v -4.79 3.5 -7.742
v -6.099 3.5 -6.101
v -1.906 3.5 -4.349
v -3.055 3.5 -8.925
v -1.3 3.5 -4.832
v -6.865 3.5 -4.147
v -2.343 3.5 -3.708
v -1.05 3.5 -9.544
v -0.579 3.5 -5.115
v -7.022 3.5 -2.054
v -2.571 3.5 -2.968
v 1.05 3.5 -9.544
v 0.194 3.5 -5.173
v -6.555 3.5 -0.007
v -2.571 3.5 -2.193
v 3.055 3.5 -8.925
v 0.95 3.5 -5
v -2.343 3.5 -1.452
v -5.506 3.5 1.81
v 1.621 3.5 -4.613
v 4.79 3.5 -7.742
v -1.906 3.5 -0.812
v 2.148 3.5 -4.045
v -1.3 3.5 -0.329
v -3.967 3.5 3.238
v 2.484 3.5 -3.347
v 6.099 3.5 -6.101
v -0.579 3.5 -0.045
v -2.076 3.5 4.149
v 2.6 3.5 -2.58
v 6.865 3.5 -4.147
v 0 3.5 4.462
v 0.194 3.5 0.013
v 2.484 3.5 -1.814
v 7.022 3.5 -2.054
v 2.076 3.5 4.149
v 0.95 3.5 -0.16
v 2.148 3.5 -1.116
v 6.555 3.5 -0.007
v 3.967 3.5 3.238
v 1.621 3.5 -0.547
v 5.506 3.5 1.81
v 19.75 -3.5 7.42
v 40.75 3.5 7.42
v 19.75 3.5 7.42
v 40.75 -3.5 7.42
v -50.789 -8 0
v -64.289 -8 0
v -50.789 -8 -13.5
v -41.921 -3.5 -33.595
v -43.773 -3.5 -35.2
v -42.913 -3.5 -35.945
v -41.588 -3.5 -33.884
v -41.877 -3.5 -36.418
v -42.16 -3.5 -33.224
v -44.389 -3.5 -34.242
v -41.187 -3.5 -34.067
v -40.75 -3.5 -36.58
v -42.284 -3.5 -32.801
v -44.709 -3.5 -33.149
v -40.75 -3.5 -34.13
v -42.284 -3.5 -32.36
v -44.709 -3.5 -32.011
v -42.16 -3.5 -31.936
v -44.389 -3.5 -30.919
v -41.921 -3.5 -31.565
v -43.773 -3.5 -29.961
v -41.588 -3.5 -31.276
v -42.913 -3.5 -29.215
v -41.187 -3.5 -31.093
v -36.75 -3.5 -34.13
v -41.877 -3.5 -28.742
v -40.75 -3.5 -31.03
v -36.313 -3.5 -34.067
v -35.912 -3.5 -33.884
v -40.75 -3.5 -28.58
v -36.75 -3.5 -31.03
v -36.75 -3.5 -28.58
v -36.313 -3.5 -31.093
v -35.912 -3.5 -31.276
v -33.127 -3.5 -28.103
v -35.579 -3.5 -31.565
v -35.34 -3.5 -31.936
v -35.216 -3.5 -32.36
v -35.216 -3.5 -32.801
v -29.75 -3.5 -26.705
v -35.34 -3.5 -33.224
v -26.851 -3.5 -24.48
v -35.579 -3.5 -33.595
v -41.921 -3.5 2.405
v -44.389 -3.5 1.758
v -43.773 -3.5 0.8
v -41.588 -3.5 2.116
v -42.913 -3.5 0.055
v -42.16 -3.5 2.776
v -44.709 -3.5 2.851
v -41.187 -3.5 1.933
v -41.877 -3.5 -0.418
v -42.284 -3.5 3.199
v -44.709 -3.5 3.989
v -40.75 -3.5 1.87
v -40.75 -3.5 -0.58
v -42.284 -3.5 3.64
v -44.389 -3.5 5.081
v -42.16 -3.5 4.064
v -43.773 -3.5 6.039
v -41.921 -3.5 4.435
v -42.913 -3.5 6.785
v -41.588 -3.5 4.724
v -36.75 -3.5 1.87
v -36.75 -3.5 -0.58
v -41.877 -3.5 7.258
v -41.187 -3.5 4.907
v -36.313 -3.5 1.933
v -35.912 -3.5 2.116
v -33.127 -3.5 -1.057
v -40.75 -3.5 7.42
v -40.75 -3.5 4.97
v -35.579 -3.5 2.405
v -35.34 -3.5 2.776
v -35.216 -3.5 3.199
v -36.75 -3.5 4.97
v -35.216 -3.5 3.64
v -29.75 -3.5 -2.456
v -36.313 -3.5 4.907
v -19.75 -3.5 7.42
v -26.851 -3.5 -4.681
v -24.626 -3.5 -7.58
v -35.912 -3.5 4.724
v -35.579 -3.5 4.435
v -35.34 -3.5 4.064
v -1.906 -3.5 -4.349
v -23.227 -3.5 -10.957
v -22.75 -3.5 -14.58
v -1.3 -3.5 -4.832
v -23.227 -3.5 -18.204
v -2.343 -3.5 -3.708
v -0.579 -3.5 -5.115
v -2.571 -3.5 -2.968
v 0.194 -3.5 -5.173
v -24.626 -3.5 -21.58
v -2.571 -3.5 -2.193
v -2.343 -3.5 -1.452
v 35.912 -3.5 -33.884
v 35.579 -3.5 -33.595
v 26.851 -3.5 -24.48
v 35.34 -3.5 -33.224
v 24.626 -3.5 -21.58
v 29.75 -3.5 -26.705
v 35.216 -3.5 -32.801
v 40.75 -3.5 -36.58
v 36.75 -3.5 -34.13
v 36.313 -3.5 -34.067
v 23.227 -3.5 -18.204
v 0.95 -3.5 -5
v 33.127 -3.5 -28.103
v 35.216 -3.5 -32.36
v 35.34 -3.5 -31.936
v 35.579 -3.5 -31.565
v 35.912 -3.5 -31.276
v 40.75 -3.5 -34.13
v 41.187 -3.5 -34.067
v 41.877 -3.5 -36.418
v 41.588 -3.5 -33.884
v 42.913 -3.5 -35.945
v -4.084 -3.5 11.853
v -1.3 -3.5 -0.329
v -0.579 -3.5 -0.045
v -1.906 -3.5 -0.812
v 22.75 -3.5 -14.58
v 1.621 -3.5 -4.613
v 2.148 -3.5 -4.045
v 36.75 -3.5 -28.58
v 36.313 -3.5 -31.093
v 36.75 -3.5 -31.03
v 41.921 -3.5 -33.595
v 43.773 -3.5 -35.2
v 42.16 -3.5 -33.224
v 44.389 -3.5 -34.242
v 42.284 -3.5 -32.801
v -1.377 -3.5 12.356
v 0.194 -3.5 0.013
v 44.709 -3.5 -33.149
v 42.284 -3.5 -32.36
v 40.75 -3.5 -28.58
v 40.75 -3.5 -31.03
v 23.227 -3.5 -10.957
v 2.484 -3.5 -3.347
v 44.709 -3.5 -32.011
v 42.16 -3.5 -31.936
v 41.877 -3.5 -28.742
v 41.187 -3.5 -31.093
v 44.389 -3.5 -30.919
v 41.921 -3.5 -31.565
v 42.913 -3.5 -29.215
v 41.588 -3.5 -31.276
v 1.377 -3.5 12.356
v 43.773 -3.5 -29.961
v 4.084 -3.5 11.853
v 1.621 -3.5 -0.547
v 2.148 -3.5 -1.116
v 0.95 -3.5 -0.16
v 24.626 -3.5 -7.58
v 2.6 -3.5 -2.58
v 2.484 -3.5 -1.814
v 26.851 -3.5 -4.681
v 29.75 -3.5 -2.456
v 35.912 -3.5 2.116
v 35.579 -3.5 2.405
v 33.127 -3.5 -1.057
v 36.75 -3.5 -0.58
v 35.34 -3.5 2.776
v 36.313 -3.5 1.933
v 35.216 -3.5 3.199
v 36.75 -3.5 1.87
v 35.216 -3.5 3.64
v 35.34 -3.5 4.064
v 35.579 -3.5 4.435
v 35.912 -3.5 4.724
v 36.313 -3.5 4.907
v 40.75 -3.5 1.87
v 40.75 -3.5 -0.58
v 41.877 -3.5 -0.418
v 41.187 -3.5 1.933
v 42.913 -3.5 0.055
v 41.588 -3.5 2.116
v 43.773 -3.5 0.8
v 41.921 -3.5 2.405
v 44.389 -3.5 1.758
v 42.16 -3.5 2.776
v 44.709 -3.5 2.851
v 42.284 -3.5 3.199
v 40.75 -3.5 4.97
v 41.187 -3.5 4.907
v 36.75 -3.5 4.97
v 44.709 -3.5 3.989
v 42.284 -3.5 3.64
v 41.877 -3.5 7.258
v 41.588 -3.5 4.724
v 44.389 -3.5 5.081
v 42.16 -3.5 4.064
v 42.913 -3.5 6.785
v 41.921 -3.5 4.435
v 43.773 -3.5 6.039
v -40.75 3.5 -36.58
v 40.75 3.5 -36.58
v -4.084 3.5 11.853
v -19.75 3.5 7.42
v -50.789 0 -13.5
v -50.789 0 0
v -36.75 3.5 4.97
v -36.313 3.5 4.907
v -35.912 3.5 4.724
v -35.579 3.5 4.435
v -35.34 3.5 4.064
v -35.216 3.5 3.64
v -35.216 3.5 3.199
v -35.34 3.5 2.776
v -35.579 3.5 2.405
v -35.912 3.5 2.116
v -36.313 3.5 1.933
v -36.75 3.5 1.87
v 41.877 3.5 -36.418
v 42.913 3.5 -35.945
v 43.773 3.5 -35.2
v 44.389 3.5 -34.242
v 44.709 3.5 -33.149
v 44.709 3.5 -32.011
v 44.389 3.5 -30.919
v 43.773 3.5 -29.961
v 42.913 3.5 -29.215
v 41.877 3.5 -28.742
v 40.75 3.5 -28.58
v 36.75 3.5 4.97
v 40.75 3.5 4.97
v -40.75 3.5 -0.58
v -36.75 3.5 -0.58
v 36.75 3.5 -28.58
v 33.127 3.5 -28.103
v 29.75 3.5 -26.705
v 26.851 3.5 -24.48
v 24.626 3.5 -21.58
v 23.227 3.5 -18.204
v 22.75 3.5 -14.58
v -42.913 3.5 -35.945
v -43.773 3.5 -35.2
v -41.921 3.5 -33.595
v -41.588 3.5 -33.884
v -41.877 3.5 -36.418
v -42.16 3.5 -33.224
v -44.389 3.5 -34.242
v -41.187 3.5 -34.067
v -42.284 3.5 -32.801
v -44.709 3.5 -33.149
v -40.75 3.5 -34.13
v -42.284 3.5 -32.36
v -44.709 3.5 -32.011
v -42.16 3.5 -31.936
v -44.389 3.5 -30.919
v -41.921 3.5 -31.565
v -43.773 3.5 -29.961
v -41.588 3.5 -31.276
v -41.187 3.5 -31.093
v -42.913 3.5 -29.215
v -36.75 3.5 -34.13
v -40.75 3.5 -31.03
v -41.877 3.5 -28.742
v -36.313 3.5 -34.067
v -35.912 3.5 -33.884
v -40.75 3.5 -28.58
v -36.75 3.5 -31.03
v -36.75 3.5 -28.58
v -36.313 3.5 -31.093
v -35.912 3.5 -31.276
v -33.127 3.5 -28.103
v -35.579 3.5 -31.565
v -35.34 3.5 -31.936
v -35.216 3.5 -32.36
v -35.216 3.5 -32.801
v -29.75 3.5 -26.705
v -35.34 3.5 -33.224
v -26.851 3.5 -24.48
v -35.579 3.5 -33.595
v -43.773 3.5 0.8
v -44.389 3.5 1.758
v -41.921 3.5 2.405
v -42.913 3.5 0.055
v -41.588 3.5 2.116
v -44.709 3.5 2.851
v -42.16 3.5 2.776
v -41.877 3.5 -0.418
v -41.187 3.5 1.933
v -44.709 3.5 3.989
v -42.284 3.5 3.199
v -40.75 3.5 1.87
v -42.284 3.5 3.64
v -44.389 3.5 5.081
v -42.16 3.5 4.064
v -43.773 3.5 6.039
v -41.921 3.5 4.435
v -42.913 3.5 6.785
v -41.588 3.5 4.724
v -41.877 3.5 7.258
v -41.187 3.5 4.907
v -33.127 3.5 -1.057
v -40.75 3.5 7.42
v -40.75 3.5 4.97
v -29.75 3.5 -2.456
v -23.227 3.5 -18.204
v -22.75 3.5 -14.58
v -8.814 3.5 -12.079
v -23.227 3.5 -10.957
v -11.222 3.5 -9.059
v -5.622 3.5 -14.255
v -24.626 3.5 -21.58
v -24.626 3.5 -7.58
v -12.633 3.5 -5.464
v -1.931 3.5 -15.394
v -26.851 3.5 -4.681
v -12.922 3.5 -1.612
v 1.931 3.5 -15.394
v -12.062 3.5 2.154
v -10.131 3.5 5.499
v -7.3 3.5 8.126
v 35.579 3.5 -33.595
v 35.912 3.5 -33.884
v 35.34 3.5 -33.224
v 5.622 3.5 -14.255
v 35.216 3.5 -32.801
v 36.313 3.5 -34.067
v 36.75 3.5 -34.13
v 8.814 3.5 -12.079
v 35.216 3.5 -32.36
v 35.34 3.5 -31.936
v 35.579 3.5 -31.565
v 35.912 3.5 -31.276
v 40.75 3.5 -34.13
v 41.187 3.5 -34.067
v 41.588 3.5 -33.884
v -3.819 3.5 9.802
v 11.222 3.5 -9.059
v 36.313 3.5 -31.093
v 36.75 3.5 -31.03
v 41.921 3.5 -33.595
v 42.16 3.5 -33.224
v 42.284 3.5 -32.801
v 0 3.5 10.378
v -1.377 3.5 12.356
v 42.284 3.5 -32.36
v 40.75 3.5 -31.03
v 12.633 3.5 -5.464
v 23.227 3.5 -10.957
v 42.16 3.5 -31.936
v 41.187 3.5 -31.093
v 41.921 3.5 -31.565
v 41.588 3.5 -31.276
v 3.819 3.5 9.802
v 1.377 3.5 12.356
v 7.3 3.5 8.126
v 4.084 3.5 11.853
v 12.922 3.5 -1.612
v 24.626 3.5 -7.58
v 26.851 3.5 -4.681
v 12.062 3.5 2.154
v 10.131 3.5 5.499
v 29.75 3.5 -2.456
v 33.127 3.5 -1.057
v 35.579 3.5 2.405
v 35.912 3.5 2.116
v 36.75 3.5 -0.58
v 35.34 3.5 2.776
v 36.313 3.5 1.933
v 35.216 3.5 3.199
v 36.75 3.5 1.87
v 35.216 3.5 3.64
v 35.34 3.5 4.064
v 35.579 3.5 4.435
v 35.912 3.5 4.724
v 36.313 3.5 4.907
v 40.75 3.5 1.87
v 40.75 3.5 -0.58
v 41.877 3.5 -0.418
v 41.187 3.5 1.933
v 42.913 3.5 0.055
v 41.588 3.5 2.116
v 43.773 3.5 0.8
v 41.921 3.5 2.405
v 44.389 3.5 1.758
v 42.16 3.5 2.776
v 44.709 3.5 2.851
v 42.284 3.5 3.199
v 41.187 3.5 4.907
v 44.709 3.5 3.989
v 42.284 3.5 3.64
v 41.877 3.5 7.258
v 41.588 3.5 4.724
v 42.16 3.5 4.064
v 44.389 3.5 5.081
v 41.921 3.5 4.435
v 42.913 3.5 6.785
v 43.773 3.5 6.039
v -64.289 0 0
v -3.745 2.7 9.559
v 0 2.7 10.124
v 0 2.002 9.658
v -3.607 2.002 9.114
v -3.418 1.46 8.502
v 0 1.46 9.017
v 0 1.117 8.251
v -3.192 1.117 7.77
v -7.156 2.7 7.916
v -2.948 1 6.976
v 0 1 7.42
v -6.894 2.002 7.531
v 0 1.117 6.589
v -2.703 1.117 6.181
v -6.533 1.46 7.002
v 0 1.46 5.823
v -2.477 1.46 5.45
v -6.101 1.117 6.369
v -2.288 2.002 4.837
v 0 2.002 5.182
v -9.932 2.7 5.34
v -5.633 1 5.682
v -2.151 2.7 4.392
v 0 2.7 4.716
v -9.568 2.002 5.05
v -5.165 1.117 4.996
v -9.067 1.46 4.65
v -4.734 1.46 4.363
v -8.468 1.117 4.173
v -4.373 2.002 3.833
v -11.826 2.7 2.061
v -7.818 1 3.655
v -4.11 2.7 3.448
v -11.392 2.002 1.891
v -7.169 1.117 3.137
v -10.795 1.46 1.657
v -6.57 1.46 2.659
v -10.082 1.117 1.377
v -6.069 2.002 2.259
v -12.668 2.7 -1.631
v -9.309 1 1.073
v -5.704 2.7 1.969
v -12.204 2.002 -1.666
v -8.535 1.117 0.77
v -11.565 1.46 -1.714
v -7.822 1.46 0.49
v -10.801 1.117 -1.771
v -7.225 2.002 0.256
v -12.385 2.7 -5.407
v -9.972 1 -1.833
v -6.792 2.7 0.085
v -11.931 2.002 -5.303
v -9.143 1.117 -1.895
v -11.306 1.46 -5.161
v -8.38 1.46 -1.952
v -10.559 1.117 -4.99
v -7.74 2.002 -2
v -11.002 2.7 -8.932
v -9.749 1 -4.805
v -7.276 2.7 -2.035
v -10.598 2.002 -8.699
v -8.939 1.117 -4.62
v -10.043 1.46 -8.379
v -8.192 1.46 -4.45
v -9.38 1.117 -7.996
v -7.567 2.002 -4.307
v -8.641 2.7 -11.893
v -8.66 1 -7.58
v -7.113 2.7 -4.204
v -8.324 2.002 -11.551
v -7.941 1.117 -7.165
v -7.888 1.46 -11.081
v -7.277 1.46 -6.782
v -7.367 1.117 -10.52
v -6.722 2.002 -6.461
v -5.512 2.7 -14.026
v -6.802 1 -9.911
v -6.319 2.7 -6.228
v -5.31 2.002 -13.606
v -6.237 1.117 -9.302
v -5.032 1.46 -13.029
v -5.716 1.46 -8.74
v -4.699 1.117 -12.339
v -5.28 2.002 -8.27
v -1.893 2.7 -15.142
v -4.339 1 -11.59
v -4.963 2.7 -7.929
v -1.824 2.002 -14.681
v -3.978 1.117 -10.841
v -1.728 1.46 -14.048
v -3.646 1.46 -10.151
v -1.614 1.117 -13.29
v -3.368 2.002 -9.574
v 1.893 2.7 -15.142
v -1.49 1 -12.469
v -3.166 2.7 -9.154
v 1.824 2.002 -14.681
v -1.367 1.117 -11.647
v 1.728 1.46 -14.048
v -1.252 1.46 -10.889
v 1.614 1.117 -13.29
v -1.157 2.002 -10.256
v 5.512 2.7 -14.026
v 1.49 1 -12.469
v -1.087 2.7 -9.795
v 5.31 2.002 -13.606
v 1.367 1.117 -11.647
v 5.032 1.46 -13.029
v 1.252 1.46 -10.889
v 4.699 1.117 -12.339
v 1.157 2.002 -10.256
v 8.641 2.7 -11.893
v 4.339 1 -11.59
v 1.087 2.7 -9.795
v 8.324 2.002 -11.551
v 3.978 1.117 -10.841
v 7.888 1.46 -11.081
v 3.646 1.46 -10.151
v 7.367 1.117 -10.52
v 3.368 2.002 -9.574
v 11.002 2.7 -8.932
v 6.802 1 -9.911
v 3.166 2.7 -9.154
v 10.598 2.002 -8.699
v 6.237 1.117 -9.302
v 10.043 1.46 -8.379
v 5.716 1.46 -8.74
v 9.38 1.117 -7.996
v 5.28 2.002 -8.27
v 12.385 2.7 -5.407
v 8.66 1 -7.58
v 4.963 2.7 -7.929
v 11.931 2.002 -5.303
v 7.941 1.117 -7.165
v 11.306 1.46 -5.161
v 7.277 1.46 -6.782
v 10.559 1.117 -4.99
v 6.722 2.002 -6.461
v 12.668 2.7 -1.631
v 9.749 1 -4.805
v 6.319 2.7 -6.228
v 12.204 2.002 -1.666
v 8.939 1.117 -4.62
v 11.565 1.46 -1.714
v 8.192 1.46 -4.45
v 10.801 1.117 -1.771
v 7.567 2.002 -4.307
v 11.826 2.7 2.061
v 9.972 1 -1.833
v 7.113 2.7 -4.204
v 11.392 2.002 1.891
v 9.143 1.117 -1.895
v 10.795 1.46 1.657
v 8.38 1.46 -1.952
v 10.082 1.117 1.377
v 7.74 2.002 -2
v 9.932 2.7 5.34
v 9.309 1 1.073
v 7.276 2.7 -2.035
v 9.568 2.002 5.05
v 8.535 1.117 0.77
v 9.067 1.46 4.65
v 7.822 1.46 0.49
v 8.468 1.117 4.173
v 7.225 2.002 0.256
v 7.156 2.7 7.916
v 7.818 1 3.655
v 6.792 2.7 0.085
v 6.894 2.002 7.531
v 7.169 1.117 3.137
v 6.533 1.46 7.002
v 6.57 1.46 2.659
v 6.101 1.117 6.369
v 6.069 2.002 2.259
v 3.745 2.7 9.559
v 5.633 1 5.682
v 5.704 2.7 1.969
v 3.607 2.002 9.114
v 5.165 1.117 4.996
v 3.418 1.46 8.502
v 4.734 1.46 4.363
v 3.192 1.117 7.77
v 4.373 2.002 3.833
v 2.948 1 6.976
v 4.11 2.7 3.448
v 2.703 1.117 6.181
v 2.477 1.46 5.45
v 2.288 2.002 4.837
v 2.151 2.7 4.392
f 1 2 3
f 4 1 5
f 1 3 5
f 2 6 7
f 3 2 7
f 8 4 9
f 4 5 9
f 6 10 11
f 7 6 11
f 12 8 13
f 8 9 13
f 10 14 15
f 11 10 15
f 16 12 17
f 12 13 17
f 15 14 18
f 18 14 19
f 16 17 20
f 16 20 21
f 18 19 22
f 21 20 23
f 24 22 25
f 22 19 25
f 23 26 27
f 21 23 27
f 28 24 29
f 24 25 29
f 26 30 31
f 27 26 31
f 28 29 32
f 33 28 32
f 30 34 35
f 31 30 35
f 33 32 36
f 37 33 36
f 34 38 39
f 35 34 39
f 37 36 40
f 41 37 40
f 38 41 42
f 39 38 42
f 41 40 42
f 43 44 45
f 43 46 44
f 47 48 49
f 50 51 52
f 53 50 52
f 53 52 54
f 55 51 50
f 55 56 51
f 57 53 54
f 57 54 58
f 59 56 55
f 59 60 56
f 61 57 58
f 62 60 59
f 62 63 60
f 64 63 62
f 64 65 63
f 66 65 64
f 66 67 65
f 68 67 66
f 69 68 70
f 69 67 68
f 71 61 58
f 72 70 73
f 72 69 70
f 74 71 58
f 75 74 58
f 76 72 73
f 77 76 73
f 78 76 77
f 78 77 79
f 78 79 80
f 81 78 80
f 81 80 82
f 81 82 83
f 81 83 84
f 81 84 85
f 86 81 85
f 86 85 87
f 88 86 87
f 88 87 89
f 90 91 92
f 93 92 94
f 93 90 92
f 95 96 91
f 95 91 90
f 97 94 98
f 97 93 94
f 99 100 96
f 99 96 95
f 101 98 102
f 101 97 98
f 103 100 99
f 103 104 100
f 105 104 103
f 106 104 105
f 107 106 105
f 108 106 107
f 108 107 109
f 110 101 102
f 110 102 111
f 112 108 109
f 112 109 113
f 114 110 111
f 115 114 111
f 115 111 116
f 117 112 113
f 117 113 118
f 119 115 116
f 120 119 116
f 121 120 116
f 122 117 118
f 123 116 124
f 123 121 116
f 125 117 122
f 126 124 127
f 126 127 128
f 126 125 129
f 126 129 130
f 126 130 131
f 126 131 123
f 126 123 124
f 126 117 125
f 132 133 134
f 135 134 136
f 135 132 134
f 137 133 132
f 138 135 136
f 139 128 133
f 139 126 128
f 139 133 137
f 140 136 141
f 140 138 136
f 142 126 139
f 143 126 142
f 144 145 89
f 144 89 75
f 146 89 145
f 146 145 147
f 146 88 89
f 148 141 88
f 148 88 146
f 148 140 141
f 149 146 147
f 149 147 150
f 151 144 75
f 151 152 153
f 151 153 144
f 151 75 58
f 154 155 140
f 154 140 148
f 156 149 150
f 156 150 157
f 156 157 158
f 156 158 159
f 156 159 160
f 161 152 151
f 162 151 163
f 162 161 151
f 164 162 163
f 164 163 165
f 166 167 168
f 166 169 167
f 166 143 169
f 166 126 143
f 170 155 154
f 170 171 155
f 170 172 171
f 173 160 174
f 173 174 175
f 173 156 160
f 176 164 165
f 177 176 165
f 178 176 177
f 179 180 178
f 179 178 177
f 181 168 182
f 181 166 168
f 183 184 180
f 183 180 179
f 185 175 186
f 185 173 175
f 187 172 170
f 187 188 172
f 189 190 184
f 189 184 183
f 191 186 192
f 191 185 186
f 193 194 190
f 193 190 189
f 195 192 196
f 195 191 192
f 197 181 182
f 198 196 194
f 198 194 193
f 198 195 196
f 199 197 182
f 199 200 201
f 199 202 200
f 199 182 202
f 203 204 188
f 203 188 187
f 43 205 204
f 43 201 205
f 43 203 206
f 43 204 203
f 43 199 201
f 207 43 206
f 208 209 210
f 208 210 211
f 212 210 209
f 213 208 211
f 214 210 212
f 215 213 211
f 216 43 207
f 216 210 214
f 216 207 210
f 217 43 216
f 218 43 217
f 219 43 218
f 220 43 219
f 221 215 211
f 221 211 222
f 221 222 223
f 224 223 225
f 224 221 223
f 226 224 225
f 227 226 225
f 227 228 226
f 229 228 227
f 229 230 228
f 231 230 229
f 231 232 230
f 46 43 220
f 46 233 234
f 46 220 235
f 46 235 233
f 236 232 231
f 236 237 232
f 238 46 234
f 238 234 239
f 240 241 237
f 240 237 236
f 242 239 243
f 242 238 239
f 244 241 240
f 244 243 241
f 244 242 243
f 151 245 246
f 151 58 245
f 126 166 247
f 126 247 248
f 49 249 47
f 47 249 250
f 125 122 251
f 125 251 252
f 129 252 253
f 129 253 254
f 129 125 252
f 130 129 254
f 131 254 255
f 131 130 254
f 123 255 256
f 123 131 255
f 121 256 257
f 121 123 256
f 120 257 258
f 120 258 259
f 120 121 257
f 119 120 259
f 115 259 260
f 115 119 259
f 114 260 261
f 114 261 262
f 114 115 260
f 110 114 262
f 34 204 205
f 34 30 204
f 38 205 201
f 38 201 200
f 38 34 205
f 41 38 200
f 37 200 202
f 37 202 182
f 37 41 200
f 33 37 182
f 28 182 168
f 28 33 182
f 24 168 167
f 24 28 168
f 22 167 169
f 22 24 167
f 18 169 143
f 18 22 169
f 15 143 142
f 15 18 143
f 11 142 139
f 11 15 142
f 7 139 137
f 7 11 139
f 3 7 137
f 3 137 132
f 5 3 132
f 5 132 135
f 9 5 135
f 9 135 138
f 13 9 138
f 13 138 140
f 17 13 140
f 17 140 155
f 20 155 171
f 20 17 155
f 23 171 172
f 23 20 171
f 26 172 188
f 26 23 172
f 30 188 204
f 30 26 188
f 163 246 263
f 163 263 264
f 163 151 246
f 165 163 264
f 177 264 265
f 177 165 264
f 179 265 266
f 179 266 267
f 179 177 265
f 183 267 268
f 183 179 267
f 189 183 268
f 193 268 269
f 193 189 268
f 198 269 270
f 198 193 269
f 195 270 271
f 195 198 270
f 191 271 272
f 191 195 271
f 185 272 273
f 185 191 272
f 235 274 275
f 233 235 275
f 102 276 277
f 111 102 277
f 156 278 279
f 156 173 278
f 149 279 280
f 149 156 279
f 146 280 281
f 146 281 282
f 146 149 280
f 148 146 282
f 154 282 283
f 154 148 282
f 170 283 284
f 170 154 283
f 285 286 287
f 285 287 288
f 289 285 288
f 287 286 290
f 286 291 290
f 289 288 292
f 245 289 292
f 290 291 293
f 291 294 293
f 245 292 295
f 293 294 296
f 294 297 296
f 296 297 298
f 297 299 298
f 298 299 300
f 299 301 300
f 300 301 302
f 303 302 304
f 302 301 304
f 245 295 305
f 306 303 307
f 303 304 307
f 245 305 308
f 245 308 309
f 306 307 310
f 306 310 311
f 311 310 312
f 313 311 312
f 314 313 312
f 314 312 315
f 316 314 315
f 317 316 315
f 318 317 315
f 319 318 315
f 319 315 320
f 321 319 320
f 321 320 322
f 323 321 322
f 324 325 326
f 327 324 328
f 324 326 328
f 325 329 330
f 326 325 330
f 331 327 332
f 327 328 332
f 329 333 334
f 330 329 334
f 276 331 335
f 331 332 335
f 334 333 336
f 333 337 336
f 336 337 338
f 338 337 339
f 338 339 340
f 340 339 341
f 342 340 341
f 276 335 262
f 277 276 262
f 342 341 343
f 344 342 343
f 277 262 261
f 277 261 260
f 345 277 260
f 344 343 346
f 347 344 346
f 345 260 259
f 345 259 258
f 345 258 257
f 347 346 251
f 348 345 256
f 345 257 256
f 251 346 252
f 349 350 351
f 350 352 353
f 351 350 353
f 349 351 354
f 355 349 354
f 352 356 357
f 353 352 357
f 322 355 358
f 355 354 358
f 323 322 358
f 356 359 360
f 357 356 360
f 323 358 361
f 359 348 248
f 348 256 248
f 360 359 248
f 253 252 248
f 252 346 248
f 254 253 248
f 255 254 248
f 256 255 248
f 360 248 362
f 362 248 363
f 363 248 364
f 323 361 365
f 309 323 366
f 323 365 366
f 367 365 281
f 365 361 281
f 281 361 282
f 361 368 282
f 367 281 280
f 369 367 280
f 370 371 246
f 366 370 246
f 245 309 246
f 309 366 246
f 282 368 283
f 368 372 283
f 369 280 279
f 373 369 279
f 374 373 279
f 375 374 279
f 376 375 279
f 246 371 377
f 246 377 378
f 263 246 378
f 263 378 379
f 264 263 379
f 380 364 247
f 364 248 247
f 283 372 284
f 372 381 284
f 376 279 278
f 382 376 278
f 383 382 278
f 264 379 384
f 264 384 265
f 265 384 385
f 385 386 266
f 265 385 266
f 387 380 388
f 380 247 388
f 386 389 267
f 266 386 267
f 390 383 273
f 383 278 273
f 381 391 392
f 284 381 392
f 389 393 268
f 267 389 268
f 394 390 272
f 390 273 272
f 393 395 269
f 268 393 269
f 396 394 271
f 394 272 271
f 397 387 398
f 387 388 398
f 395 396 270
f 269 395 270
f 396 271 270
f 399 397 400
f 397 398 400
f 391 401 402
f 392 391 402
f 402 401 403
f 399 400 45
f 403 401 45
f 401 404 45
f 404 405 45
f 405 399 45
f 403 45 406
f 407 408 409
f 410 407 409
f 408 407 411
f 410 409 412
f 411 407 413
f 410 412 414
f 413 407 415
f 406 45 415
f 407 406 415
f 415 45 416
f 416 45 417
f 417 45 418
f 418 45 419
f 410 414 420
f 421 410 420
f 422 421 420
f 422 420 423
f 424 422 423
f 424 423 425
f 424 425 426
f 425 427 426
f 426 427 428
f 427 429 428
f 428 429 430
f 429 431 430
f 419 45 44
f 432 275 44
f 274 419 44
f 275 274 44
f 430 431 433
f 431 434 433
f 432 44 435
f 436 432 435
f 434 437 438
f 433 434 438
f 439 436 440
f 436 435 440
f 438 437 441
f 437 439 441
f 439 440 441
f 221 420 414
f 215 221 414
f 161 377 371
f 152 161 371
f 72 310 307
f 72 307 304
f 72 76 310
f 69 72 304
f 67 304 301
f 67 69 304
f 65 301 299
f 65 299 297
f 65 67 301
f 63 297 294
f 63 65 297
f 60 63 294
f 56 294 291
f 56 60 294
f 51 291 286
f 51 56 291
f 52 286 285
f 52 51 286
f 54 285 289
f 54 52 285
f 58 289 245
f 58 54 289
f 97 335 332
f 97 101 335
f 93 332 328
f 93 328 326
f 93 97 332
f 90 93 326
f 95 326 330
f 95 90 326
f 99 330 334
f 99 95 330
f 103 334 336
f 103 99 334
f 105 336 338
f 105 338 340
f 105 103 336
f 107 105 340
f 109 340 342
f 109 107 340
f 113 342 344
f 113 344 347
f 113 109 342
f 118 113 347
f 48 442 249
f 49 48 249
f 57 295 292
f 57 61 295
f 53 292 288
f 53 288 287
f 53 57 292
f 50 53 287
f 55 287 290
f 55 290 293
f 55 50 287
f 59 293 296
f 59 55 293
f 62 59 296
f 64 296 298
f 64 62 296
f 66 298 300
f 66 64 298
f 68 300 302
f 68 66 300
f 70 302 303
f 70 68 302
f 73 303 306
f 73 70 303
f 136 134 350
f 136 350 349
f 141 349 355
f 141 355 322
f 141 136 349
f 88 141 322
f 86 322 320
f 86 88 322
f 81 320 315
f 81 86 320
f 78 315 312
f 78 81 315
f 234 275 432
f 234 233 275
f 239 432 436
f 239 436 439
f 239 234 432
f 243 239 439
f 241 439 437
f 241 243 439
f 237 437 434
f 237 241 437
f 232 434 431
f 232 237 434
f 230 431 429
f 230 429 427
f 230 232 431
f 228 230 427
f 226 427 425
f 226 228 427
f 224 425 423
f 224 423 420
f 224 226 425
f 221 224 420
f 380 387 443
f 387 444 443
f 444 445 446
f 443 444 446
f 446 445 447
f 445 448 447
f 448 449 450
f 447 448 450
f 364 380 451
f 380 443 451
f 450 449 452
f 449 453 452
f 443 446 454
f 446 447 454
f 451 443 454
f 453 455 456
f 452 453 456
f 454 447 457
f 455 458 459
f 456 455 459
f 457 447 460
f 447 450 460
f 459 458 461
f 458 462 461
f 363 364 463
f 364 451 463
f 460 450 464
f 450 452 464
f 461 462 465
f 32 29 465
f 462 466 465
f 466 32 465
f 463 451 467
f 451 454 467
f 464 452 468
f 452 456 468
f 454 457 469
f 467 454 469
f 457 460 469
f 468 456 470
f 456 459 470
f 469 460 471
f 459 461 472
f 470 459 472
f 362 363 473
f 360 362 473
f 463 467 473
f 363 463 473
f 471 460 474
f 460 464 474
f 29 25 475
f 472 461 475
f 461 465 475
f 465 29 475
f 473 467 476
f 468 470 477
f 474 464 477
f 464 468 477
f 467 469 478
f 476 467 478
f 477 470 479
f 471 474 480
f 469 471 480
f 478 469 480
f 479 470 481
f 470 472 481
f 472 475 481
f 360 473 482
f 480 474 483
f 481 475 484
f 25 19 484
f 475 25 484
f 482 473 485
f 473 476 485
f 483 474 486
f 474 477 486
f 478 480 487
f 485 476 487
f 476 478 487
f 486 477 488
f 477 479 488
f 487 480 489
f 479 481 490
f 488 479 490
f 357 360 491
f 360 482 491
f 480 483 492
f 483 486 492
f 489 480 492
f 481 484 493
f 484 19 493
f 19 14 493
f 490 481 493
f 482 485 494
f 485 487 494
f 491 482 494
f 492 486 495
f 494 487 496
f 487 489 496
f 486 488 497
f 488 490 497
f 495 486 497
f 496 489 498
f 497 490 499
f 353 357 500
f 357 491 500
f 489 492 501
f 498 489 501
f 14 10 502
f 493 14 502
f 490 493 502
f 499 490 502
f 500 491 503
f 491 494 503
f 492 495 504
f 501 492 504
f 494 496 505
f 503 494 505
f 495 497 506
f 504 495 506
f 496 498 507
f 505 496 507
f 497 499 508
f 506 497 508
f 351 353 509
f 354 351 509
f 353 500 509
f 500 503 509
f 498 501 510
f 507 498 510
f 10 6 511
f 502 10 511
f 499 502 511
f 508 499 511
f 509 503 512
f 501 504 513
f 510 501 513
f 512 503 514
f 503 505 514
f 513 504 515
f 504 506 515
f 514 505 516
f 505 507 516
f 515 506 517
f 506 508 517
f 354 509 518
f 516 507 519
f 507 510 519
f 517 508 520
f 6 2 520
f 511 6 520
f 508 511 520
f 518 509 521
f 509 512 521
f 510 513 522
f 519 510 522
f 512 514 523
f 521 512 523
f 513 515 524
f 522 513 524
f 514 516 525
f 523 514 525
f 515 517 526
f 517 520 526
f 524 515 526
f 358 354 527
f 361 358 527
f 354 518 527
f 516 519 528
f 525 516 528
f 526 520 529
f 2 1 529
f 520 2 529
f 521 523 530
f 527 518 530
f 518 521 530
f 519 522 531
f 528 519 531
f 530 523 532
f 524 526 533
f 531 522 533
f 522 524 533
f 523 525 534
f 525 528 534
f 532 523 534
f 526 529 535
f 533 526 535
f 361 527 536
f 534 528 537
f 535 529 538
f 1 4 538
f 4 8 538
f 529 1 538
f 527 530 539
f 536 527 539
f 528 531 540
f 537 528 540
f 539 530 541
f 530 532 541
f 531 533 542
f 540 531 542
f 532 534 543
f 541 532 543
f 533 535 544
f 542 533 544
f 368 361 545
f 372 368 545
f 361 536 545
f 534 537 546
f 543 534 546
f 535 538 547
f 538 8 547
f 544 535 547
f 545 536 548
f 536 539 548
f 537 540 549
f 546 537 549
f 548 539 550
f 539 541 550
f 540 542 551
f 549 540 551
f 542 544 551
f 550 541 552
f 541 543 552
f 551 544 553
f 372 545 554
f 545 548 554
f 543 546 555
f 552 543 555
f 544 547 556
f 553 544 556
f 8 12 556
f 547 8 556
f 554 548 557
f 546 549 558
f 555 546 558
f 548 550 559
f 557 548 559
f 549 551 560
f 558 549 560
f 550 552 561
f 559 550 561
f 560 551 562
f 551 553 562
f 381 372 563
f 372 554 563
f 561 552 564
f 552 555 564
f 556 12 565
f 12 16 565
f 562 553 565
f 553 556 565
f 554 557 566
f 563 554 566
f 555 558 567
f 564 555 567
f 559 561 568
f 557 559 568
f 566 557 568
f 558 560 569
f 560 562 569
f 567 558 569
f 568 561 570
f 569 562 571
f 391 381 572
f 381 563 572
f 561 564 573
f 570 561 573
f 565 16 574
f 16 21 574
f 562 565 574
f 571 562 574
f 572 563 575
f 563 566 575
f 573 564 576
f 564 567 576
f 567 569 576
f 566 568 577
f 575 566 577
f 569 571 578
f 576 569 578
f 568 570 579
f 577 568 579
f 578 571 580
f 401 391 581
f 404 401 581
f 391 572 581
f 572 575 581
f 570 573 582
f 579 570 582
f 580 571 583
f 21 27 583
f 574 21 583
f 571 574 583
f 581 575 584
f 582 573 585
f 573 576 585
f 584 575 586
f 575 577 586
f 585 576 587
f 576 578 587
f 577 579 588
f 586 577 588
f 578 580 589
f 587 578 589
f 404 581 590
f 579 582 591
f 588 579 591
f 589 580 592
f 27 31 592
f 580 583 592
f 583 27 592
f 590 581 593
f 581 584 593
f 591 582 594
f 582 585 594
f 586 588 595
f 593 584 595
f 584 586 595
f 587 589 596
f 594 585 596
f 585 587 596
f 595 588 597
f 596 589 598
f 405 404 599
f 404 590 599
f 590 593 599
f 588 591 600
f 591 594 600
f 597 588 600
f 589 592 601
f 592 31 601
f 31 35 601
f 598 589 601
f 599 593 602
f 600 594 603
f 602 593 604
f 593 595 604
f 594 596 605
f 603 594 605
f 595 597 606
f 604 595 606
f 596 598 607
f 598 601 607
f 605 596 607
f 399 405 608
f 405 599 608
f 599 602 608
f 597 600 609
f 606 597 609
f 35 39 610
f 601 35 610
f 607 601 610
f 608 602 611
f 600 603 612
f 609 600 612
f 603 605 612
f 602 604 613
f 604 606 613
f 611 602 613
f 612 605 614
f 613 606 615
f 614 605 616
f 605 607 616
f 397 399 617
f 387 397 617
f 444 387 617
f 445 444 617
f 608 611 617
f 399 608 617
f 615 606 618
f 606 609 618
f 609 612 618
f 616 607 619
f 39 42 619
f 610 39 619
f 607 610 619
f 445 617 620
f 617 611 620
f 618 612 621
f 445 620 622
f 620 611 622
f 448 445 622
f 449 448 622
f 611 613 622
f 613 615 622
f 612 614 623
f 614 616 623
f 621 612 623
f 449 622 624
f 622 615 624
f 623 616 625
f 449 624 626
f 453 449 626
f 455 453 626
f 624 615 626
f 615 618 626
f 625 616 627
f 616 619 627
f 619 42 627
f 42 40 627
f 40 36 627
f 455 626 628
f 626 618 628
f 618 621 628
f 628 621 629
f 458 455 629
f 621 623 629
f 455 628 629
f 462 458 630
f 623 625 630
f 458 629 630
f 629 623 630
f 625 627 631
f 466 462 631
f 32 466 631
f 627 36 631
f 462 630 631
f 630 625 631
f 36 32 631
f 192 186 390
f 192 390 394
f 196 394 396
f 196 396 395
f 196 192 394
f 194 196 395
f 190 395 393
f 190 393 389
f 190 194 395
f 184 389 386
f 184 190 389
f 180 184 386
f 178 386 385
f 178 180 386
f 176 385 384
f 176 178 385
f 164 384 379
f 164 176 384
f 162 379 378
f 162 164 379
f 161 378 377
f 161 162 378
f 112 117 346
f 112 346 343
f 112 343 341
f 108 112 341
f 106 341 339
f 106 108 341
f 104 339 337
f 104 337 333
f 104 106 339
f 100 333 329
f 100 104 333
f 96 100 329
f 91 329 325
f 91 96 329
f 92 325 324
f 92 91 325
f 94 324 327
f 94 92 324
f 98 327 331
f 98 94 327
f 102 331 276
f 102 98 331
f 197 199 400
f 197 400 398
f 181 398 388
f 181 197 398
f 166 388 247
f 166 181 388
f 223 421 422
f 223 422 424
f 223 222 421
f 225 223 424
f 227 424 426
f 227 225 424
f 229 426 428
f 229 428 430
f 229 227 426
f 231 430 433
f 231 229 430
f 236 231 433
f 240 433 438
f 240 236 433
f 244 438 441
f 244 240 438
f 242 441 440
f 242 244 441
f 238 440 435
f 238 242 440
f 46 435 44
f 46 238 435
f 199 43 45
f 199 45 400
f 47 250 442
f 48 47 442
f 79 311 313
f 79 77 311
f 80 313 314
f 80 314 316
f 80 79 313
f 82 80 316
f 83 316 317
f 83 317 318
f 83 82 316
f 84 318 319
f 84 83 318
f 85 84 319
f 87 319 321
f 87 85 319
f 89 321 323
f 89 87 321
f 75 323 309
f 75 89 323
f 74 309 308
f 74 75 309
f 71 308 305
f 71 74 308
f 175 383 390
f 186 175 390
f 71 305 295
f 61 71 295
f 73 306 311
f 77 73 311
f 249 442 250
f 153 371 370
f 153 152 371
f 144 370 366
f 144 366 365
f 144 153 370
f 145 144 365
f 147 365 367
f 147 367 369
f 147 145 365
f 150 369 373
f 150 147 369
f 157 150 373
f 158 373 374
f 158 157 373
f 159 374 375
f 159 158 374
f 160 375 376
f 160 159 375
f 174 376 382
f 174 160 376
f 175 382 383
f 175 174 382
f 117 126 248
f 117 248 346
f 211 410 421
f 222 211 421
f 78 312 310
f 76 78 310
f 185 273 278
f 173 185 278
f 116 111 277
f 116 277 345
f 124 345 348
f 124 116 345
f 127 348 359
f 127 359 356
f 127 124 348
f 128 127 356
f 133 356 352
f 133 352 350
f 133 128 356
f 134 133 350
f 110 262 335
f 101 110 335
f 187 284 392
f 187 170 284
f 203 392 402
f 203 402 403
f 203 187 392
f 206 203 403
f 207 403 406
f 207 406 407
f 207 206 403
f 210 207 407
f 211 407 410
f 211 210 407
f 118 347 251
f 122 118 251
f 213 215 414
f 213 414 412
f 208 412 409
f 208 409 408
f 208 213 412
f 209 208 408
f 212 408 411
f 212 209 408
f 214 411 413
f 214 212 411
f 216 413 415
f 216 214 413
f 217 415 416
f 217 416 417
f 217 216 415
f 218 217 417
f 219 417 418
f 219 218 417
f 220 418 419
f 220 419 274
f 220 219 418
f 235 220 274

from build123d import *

# Parameters (mm, degrees)
F0_R          = 2.6
F1_DEPTH      = 3.5
F1_DEPTH_BACK = 3.5
F2_DEPTH      = 8
F3_R          = 3


# Not quite as in the source:
# - ends of sketch curves that miss each other by under 0.0002 mm in the source are joined


with BuildPart() as f1:
    # F0 (on Front) → F1 (new body, two sides)
    with BuildSketch(Plane.XZ) as f1_sk:
        with BuildLine():
            Line((40.7500048285, 7.4198008843), (19.75, 7.4198008843))
            Line((19.75, 7.4198008843), (19.75, -14.5801991157))
            Line((19.75, -14.5801991157), (22.7499971869, -14.5801991157))
            ThreePointArc((22.7499971869, -14.5801991157), (26.8505050634, -4.6807041791), (36.75, -0.5801991157))
            Line((36.75, -0.5801991157), (40.75, -0.5801991157))
            ThreePointArc((40.75, -0.5801991157), (44.75, 3.4197984701), (40.7500048285, 7.4198008843))
        make_face()
        with BuildLine():
            Line((40.75, 1.8698008843), (36.75, 1.8698008843))
            ThreePointArc((36.75, 1.8698008843), (35.2, 3.4198008843), (36.75, 4.9698008843))
            Line((36.75, 4.9698008843), (40.75, 4.9698008843))
            ThreePointArc((40.75, 4.9698008843), (42.3, 3.4198008843), (40.75, 1.8698008843))
        make_face(mode=Mode.SUBTRACT)
        with BuildLine():
            Line((22.7499971869, -14.5801991157), (19.75, -14.5801991157))
            Line((19.75, -14.5801991157), (19.75, -36.5801991157))
            Line((19.75, -36.5801991157), (40.7500048285, -36.5801991157))
            ThreePointArc((40.7500048285, -36.5801991157), (44.75, -32.5801967015), (40.75, -28.5801991157))
            Line((40.75, -28.5801991157), (36.75, -28.5801991157))
            ThreePointArc((36.75, -28.5801991157), (26.8505050634, -24.4796940523), (22.7499971869, -14.5801991157))
        make_face()
        with BuildLine():
            ThreePointArc((40.75, -31.0301991157), (42.3, -32.5801991157), (40.75, -34.1301991157))
            Line((40.75, -34.1301991157), (36.75, -34.1301991157))
            ThreePointArc((36.75, -34.1301991157), (35.2, -32.5801991157), (36.75, -31.0301991157))
            Line((36.75, -31.0301991157), (40.75, -31.0301991157))
        make_face(mode=Mode.SUBTRACT)
        with BuildLine():
            ThreePointArc((4.0844565269, 11.8529992436), (11.9638381781, 6.4678159179), (15, -2.5801991157))
            ThreePointArc((15, -2.5801991157), (-9.0480150336, -14.5440372938), (-4.0844565269, 11.8529992436))
            Line((-4.0844565269, 11.8529992436), (-19.75, 7.4198008843))
            Line((-19.75, 7.4198008843), (-19.75, -14.5801991157))
            Line((-19.75, -14.5801991157), (-19.75, -36.5801991157))
            Line((-19.75, -36.5801991157), (0, -36.5801991157))
            Line((0, -36.5801991157), (19.75, -36.5801991157))
            Line((19.75, -36.5801991157), (19.75, -14.5801991157))
            Line((19.75, -14.5801991157), (19.75, 7.4198008843))
            Line((19.75, 7.4198008843), (4.0844565269, 11.8529992436))
        make_face()
        with BuildLine():
            ThreePointArc((-4.0844565269, 11.8529992436), (-9.0480150336, -14.5440372938), (15, -2.5801991157))
            ThreePointArc((15, -2.5801991157), (11.9638381781, 6.4678159179), (4.0844565269, 11.8529992436))
            ThreePointArc((4.0844565269, 11.8529992436), (0, 12.4198008843), (-4.0844565269, 11.8529992436))
        make_face()
        with Locations((0, -2.5801991157)):
            Circle(F0_R, mode=Mode.SUBTRACT)
        with BuildLine():
            Line((-19.75, -14.5801991157), (-19.75, 7.4198008843))
            Line((-19.75, 7.4198008843), (-40.7500048285, 7.4198008843))
            ThreePointArc((-40.7500048285, 7.4198008843), (-44.75, 3.4197984701), (-40.75, -0.5801991157))
            Line((-40.75, -0.5801991157), (-36.75, -0.5801991157))
            ThreePointArc((-36.75, -0.5801991157), (-26.8505050634, -4.6807041791), (-22.75, -14.5801991157))
            Line((-22.75, -14.5801991157), (-19.75, -14.5801991157))
        make_face()
        with BuildLine():
            ThreePointArc((-36.75, 4.9698008843), (-35.2, 3.4198008843), (-36.75, 1.8698008843))
            Line((-36.75, 1.8698008843), (-40.75, 1.8698008843))
            ThreePointArc((-40.75, 1.8698008843), (-42.3, 3.4198008843), (-40.75, 4.9698008843))
            Line((-40.75, 4.9698008843), (-36.75, 4.9698008843))
        make_face(mode=Mode.SUBTRACT)
        with BuildLine():
            Line((-19.75, -36.5801991157), (-19.75, -14.5801991157))
            Line((-19.75, -14.5801991157), (-22.7499971869, -14.5801991157))
            ThreePointArc((-22.7499971869, -14.5801991157), (-26.8505050634, -24.4796940523), (-36.75, -28.5801991157))
            Line((-36.75, -28.5801991157), (-40.75, -28.5801991157))
            ThreePointArc((-40.75, -28.5801991157), (-44.75, -32.5801967015), (-40.7500048285, -36.5801991157))
            Line((-40.7500048285, -36.5801991157), (-19.75, -36.5801991157))
        make_face()
        with BuildLine():
            Line((-36.75, -34.1301991157), (-40.75, -34.1301991157))
            ThreePointArc((-40.75, -34.1301991157), (-42.3, -32.5801991157), (-40.75, -31.0301991157))
            Line((-40.75, -31.0301991157), (-36.75, -31.0301991157))
            ThreePointArc((-36.75, -31.0301991157), (-35.2, -32.5801991157), (-36.75, -34.1301991157))
        make_face(mode=Mode.SUBTRACT)
    extrude(amount=F1_DEPTH)
    extrude(f1_sk.sketch, amount=-F1_DEPTH_BACK)

    # F3 (on Right) → F4 (revolve, cut)
    with BuildSketch(Plane.YZ):
        with Locations((4, 7.4198008843)):
            Circle(F3_R)
    revolve(axis=Axis((0, 0, -2.5801991157), (0, -1, 0)), mode=Mode.SUBTRACT)


with BuildPart() as f2:
    # F0 (on Front) → F2 (new body)
    with BuildSketch(Plane.XZ):
        Polygon((-50.7889514565, -13.5), (-50.7889514565, 0), (-64.2889514565, 0), align=None)
    extrude(amount=F2_DEPTH)


solid = Compound([f1.part, f2.part])
